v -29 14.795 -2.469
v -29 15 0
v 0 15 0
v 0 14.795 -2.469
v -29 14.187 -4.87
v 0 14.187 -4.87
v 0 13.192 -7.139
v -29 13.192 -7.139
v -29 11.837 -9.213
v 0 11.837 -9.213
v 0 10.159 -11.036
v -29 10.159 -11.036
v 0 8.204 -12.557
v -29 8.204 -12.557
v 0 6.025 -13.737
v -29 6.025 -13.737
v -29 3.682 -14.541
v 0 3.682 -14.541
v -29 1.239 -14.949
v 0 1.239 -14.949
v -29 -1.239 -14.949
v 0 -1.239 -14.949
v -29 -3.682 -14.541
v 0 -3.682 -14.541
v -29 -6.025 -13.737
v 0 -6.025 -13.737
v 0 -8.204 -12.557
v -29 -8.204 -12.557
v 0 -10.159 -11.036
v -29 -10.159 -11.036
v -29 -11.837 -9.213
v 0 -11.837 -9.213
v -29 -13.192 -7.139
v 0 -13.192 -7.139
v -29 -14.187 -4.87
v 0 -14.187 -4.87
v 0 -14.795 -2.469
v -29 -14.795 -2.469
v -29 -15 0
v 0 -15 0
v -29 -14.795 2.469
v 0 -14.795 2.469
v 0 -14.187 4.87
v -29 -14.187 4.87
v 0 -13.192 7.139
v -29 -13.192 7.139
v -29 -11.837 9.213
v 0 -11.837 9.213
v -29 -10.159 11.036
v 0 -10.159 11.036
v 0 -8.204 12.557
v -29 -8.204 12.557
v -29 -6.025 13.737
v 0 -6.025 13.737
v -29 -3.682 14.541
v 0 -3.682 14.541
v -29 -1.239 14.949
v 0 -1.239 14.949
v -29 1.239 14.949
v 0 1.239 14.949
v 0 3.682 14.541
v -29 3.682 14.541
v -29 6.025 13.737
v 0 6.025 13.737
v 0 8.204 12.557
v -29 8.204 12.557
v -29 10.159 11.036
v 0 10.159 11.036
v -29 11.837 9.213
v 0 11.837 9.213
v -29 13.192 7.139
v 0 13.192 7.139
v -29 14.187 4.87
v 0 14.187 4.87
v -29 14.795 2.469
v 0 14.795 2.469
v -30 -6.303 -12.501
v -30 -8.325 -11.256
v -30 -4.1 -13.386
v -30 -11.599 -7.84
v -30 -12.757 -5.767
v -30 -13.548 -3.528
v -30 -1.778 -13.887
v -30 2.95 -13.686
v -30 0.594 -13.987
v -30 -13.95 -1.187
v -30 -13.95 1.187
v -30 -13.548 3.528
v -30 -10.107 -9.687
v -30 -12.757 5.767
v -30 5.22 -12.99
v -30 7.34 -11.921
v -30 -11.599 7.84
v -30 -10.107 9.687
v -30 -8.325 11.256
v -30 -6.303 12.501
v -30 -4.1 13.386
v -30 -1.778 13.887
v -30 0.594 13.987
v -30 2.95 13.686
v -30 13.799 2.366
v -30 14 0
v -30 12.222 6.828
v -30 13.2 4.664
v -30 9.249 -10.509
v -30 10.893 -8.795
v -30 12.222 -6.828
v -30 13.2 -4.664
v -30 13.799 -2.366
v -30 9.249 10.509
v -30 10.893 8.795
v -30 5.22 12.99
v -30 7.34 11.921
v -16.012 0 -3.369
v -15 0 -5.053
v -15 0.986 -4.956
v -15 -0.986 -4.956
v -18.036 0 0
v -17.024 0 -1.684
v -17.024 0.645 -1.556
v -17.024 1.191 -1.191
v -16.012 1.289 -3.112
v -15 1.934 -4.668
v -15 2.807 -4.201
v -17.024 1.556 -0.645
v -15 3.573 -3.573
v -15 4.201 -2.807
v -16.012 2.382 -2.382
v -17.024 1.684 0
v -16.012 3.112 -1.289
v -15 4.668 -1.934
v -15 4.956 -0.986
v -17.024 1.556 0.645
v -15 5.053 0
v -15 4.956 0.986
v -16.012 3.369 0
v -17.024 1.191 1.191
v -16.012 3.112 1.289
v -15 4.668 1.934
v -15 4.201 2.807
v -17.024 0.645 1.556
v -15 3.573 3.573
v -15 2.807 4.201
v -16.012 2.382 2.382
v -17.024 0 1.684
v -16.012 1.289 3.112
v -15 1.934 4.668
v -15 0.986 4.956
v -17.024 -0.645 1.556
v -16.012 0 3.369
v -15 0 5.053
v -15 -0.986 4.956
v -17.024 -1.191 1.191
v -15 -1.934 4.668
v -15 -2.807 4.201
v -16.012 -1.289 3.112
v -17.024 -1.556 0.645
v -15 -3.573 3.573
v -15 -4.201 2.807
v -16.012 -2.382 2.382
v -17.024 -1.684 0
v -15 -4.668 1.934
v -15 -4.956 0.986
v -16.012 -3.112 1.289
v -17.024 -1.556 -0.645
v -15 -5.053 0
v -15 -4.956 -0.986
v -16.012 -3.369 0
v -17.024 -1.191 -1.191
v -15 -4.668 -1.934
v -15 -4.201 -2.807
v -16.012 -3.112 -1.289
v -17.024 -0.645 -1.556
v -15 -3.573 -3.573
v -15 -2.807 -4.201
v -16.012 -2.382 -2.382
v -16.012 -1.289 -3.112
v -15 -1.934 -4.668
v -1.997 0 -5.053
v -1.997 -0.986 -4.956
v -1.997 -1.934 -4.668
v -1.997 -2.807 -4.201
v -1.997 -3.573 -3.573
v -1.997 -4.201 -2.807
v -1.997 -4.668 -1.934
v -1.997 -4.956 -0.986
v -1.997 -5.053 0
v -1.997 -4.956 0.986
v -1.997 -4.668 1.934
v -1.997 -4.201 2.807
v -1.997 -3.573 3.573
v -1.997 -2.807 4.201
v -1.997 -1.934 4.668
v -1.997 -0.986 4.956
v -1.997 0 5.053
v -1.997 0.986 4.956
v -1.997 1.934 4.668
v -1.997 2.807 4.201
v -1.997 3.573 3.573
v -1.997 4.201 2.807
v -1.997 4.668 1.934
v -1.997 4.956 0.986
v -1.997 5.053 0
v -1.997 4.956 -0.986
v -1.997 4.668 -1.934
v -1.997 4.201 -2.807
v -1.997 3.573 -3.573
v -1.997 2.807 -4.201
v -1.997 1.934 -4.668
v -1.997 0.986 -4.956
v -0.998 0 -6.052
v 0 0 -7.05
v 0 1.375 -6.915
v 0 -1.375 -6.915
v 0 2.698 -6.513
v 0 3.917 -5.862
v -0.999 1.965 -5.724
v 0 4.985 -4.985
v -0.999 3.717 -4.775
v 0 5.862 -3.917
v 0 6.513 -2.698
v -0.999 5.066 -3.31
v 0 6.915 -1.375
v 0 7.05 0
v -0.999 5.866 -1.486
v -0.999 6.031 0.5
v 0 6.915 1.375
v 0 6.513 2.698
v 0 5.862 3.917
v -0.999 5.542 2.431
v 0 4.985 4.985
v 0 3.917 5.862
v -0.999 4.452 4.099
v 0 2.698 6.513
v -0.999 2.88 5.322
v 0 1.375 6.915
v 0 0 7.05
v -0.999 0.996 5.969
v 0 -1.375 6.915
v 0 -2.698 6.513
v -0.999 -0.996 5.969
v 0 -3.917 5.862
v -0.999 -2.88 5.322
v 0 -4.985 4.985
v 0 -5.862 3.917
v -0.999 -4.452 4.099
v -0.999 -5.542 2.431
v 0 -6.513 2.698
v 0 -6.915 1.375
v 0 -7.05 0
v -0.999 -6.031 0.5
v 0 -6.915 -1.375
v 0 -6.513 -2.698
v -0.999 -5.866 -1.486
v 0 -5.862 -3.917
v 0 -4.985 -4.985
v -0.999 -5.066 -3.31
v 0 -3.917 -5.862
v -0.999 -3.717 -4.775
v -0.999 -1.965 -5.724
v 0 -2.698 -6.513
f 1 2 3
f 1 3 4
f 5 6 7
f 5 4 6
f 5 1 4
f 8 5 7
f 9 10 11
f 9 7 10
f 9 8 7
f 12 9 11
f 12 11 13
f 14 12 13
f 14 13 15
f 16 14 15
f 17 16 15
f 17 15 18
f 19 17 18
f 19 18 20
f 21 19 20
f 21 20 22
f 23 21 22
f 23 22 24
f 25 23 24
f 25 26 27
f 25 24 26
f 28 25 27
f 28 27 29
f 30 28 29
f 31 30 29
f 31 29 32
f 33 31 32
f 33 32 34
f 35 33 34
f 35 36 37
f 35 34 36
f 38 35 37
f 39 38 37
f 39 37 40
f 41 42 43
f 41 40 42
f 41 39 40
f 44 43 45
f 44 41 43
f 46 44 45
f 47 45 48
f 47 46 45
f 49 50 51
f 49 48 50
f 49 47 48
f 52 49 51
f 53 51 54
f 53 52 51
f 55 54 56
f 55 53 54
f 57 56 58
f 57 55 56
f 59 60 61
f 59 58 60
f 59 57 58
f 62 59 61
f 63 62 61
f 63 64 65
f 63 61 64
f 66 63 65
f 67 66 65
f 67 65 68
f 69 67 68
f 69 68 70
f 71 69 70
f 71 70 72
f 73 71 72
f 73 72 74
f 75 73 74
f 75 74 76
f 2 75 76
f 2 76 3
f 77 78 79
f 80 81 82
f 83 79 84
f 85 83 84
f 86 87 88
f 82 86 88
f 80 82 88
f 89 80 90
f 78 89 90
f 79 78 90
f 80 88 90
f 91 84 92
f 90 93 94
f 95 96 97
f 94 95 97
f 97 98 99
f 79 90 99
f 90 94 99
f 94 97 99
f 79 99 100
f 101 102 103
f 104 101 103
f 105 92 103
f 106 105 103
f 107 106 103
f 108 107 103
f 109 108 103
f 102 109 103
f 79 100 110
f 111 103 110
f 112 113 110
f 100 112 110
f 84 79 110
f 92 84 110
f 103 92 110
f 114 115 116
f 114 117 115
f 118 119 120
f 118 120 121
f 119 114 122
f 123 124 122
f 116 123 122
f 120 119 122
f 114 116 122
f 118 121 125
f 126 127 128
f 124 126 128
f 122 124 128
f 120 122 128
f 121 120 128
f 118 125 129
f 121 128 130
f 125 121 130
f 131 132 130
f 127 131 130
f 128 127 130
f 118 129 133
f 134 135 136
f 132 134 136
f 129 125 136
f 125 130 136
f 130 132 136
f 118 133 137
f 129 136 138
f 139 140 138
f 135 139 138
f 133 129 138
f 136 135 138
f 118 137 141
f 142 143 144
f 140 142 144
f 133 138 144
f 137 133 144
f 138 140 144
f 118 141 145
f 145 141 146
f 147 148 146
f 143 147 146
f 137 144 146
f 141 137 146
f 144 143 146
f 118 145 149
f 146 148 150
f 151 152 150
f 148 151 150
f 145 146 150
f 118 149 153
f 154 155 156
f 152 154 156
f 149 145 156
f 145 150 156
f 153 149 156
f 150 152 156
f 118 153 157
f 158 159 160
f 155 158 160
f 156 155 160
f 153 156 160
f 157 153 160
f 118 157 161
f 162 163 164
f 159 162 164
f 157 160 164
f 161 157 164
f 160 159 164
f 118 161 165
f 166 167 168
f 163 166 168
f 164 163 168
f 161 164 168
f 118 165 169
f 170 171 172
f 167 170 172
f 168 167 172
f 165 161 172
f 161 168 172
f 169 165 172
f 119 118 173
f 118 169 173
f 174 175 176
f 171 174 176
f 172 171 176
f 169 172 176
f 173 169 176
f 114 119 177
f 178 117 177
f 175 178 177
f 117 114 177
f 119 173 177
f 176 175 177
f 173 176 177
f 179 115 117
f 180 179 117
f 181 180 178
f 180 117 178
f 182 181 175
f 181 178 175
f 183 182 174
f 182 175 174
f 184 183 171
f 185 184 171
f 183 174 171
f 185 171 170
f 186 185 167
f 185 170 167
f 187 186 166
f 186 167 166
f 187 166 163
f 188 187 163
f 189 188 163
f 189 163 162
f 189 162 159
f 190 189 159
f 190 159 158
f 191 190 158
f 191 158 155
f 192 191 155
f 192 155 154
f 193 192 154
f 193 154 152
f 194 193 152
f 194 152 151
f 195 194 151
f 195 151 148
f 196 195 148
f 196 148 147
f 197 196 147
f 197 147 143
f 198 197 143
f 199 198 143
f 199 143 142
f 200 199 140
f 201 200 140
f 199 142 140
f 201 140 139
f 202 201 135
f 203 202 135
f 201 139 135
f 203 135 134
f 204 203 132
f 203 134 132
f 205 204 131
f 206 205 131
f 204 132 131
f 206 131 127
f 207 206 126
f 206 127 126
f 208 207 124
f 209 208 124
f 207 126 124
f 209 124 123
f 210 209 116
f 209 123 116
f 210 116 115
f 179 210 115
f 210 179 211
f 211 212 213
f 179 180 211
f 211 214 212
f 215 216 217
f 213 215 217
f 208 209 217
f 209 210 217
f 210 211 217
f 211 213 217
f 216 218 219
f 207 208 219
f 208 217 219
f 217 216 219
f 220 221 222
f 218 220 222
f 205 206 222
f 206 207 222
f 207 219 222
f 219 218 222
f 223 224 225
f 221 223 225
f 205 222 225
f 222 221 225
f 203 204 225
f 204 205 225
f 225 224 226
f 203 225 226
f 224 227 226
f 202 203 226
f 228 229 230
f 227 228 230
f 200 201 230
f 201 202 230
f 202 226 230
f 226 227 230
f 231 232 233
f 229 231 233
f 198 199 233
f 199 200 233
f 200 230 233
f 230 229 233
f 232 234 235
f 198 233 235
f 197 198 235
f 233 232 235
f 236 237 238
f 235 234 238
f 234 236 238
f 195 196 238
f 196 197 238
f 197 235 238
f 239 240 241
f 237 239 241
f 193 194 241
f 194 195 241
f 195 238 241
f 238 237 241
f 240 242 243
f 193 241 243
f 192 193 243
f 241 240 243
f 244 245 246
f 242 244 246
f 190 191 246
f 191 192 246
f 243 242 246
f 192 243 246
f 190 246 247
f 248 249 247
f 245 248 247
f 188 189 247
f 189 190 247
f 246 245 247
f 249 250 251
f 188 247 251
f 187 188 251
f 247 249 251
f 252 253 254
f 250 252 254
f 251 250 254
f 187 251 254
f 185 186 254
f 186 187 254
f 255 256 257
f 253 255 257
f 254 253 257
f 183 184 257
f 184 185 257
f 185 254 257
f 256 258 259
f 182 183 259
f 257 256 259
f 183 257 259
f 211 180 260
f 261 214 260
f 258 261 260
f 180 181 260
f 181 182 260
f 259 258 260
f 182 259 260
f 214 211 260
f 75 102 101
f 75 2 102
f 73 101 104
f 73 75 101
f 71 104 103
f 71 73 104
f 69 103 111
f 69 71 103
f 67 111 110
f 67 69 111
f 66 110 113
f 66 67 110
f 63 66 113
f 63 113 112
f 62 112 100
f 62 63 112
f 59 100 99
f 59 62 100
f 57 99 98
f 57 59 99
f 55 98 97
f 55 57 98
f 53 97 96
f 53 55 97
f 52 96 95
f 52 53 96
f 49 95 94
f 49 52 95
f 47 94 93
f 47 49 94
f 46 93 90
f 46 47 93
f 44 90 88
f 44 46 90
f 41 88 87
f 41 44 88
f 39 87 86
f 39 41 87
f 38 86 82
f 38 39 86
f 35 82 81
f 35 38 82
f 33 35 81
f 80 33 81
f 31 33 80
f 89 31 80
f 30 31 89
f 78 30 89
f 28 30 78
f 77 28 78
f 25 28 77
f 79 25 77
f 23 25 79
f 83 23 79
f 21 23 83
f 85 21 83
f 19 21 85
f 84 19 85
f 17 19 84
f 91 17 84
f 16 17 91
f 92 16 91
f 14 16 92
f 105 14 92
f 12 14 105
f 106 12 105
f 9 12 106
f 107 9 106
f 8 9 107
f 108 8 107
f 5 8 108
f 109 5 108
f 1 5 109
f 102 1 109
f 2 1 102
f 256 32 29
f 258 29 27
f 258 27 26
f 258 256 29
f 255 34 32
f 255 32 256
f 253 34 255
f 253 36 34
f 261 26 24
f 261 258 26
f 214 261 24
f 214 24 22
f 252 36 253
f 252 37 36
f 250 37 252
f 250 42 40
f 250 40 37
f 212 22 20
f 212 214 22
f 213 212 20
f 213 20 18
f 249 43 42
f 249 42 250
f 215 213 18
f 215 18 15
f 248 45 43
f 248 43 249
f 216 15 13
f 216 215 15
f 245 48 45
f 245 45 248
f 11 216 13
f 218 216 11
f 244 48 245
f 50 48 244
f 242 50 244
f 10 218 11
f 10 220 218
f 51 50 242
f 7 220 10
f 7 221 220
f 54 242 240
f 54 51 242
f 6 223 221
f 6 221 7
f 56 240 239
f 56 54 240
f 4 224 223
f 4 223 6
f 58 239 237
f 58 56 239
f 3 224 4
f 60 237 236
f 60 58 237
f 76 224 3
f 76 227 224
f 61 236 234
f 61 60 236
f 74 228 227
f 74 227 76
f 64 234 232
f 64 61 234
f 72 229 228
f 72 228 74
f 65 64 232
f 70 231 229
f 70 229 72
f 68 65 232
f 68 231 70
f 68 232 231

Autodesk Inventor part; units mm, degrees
ref_plane "YZ Plane" through (0, 0, 0) normal (1, 0, 0) x (0, 1, 0)
ref_plane "XZ Plane" through (0, 0, 0) normal (0, 1, 0) x (-1, 0, 0)
ref_plane "XY Plane" through (0, 0, 0) normal (0, 0, 1) x (1, 0, 0)
sketch "Sketch1" plane through (0, 0, 0) normal (0, 0, 1) x (1, 0, 0)
  line L0 (-36, 0) -> (6, 0) projected
  line L1 (0, -3) -> (0, 18) construction
  line L2 (0, 0) -> (0, 15)
  line L3 (0, 15) -> (-30, 15)
  line L4 (-30, 15) -> (-30, 0)
  dimension "d0" = 30
  dimension "d1" = 30
revolve "Revolution1" add sketch "Sketch1" angle 360 about axis through (-10, 0, 0) along (1, 0, 0)
sketch "Sketch2" plane through (0, 0, 0) normal (1, 0, 0) x (0, 0, -1)
  circle A0 centre (0, 0) radius 15 projected
hole "Hole1" at (0, 0, 0) direction (-1, 0, 0) diameter 10.106 depth 15 tip angle 118 countersink diameter 14.1 countersink angle 90 thread size "M12x1.75" class "6H" standard "ISO Metric profile"
chamfer "Chamfer1" distance 1 angle 45 1 edges at (-30, -15, 0)
properties part number "HM1-003X"
